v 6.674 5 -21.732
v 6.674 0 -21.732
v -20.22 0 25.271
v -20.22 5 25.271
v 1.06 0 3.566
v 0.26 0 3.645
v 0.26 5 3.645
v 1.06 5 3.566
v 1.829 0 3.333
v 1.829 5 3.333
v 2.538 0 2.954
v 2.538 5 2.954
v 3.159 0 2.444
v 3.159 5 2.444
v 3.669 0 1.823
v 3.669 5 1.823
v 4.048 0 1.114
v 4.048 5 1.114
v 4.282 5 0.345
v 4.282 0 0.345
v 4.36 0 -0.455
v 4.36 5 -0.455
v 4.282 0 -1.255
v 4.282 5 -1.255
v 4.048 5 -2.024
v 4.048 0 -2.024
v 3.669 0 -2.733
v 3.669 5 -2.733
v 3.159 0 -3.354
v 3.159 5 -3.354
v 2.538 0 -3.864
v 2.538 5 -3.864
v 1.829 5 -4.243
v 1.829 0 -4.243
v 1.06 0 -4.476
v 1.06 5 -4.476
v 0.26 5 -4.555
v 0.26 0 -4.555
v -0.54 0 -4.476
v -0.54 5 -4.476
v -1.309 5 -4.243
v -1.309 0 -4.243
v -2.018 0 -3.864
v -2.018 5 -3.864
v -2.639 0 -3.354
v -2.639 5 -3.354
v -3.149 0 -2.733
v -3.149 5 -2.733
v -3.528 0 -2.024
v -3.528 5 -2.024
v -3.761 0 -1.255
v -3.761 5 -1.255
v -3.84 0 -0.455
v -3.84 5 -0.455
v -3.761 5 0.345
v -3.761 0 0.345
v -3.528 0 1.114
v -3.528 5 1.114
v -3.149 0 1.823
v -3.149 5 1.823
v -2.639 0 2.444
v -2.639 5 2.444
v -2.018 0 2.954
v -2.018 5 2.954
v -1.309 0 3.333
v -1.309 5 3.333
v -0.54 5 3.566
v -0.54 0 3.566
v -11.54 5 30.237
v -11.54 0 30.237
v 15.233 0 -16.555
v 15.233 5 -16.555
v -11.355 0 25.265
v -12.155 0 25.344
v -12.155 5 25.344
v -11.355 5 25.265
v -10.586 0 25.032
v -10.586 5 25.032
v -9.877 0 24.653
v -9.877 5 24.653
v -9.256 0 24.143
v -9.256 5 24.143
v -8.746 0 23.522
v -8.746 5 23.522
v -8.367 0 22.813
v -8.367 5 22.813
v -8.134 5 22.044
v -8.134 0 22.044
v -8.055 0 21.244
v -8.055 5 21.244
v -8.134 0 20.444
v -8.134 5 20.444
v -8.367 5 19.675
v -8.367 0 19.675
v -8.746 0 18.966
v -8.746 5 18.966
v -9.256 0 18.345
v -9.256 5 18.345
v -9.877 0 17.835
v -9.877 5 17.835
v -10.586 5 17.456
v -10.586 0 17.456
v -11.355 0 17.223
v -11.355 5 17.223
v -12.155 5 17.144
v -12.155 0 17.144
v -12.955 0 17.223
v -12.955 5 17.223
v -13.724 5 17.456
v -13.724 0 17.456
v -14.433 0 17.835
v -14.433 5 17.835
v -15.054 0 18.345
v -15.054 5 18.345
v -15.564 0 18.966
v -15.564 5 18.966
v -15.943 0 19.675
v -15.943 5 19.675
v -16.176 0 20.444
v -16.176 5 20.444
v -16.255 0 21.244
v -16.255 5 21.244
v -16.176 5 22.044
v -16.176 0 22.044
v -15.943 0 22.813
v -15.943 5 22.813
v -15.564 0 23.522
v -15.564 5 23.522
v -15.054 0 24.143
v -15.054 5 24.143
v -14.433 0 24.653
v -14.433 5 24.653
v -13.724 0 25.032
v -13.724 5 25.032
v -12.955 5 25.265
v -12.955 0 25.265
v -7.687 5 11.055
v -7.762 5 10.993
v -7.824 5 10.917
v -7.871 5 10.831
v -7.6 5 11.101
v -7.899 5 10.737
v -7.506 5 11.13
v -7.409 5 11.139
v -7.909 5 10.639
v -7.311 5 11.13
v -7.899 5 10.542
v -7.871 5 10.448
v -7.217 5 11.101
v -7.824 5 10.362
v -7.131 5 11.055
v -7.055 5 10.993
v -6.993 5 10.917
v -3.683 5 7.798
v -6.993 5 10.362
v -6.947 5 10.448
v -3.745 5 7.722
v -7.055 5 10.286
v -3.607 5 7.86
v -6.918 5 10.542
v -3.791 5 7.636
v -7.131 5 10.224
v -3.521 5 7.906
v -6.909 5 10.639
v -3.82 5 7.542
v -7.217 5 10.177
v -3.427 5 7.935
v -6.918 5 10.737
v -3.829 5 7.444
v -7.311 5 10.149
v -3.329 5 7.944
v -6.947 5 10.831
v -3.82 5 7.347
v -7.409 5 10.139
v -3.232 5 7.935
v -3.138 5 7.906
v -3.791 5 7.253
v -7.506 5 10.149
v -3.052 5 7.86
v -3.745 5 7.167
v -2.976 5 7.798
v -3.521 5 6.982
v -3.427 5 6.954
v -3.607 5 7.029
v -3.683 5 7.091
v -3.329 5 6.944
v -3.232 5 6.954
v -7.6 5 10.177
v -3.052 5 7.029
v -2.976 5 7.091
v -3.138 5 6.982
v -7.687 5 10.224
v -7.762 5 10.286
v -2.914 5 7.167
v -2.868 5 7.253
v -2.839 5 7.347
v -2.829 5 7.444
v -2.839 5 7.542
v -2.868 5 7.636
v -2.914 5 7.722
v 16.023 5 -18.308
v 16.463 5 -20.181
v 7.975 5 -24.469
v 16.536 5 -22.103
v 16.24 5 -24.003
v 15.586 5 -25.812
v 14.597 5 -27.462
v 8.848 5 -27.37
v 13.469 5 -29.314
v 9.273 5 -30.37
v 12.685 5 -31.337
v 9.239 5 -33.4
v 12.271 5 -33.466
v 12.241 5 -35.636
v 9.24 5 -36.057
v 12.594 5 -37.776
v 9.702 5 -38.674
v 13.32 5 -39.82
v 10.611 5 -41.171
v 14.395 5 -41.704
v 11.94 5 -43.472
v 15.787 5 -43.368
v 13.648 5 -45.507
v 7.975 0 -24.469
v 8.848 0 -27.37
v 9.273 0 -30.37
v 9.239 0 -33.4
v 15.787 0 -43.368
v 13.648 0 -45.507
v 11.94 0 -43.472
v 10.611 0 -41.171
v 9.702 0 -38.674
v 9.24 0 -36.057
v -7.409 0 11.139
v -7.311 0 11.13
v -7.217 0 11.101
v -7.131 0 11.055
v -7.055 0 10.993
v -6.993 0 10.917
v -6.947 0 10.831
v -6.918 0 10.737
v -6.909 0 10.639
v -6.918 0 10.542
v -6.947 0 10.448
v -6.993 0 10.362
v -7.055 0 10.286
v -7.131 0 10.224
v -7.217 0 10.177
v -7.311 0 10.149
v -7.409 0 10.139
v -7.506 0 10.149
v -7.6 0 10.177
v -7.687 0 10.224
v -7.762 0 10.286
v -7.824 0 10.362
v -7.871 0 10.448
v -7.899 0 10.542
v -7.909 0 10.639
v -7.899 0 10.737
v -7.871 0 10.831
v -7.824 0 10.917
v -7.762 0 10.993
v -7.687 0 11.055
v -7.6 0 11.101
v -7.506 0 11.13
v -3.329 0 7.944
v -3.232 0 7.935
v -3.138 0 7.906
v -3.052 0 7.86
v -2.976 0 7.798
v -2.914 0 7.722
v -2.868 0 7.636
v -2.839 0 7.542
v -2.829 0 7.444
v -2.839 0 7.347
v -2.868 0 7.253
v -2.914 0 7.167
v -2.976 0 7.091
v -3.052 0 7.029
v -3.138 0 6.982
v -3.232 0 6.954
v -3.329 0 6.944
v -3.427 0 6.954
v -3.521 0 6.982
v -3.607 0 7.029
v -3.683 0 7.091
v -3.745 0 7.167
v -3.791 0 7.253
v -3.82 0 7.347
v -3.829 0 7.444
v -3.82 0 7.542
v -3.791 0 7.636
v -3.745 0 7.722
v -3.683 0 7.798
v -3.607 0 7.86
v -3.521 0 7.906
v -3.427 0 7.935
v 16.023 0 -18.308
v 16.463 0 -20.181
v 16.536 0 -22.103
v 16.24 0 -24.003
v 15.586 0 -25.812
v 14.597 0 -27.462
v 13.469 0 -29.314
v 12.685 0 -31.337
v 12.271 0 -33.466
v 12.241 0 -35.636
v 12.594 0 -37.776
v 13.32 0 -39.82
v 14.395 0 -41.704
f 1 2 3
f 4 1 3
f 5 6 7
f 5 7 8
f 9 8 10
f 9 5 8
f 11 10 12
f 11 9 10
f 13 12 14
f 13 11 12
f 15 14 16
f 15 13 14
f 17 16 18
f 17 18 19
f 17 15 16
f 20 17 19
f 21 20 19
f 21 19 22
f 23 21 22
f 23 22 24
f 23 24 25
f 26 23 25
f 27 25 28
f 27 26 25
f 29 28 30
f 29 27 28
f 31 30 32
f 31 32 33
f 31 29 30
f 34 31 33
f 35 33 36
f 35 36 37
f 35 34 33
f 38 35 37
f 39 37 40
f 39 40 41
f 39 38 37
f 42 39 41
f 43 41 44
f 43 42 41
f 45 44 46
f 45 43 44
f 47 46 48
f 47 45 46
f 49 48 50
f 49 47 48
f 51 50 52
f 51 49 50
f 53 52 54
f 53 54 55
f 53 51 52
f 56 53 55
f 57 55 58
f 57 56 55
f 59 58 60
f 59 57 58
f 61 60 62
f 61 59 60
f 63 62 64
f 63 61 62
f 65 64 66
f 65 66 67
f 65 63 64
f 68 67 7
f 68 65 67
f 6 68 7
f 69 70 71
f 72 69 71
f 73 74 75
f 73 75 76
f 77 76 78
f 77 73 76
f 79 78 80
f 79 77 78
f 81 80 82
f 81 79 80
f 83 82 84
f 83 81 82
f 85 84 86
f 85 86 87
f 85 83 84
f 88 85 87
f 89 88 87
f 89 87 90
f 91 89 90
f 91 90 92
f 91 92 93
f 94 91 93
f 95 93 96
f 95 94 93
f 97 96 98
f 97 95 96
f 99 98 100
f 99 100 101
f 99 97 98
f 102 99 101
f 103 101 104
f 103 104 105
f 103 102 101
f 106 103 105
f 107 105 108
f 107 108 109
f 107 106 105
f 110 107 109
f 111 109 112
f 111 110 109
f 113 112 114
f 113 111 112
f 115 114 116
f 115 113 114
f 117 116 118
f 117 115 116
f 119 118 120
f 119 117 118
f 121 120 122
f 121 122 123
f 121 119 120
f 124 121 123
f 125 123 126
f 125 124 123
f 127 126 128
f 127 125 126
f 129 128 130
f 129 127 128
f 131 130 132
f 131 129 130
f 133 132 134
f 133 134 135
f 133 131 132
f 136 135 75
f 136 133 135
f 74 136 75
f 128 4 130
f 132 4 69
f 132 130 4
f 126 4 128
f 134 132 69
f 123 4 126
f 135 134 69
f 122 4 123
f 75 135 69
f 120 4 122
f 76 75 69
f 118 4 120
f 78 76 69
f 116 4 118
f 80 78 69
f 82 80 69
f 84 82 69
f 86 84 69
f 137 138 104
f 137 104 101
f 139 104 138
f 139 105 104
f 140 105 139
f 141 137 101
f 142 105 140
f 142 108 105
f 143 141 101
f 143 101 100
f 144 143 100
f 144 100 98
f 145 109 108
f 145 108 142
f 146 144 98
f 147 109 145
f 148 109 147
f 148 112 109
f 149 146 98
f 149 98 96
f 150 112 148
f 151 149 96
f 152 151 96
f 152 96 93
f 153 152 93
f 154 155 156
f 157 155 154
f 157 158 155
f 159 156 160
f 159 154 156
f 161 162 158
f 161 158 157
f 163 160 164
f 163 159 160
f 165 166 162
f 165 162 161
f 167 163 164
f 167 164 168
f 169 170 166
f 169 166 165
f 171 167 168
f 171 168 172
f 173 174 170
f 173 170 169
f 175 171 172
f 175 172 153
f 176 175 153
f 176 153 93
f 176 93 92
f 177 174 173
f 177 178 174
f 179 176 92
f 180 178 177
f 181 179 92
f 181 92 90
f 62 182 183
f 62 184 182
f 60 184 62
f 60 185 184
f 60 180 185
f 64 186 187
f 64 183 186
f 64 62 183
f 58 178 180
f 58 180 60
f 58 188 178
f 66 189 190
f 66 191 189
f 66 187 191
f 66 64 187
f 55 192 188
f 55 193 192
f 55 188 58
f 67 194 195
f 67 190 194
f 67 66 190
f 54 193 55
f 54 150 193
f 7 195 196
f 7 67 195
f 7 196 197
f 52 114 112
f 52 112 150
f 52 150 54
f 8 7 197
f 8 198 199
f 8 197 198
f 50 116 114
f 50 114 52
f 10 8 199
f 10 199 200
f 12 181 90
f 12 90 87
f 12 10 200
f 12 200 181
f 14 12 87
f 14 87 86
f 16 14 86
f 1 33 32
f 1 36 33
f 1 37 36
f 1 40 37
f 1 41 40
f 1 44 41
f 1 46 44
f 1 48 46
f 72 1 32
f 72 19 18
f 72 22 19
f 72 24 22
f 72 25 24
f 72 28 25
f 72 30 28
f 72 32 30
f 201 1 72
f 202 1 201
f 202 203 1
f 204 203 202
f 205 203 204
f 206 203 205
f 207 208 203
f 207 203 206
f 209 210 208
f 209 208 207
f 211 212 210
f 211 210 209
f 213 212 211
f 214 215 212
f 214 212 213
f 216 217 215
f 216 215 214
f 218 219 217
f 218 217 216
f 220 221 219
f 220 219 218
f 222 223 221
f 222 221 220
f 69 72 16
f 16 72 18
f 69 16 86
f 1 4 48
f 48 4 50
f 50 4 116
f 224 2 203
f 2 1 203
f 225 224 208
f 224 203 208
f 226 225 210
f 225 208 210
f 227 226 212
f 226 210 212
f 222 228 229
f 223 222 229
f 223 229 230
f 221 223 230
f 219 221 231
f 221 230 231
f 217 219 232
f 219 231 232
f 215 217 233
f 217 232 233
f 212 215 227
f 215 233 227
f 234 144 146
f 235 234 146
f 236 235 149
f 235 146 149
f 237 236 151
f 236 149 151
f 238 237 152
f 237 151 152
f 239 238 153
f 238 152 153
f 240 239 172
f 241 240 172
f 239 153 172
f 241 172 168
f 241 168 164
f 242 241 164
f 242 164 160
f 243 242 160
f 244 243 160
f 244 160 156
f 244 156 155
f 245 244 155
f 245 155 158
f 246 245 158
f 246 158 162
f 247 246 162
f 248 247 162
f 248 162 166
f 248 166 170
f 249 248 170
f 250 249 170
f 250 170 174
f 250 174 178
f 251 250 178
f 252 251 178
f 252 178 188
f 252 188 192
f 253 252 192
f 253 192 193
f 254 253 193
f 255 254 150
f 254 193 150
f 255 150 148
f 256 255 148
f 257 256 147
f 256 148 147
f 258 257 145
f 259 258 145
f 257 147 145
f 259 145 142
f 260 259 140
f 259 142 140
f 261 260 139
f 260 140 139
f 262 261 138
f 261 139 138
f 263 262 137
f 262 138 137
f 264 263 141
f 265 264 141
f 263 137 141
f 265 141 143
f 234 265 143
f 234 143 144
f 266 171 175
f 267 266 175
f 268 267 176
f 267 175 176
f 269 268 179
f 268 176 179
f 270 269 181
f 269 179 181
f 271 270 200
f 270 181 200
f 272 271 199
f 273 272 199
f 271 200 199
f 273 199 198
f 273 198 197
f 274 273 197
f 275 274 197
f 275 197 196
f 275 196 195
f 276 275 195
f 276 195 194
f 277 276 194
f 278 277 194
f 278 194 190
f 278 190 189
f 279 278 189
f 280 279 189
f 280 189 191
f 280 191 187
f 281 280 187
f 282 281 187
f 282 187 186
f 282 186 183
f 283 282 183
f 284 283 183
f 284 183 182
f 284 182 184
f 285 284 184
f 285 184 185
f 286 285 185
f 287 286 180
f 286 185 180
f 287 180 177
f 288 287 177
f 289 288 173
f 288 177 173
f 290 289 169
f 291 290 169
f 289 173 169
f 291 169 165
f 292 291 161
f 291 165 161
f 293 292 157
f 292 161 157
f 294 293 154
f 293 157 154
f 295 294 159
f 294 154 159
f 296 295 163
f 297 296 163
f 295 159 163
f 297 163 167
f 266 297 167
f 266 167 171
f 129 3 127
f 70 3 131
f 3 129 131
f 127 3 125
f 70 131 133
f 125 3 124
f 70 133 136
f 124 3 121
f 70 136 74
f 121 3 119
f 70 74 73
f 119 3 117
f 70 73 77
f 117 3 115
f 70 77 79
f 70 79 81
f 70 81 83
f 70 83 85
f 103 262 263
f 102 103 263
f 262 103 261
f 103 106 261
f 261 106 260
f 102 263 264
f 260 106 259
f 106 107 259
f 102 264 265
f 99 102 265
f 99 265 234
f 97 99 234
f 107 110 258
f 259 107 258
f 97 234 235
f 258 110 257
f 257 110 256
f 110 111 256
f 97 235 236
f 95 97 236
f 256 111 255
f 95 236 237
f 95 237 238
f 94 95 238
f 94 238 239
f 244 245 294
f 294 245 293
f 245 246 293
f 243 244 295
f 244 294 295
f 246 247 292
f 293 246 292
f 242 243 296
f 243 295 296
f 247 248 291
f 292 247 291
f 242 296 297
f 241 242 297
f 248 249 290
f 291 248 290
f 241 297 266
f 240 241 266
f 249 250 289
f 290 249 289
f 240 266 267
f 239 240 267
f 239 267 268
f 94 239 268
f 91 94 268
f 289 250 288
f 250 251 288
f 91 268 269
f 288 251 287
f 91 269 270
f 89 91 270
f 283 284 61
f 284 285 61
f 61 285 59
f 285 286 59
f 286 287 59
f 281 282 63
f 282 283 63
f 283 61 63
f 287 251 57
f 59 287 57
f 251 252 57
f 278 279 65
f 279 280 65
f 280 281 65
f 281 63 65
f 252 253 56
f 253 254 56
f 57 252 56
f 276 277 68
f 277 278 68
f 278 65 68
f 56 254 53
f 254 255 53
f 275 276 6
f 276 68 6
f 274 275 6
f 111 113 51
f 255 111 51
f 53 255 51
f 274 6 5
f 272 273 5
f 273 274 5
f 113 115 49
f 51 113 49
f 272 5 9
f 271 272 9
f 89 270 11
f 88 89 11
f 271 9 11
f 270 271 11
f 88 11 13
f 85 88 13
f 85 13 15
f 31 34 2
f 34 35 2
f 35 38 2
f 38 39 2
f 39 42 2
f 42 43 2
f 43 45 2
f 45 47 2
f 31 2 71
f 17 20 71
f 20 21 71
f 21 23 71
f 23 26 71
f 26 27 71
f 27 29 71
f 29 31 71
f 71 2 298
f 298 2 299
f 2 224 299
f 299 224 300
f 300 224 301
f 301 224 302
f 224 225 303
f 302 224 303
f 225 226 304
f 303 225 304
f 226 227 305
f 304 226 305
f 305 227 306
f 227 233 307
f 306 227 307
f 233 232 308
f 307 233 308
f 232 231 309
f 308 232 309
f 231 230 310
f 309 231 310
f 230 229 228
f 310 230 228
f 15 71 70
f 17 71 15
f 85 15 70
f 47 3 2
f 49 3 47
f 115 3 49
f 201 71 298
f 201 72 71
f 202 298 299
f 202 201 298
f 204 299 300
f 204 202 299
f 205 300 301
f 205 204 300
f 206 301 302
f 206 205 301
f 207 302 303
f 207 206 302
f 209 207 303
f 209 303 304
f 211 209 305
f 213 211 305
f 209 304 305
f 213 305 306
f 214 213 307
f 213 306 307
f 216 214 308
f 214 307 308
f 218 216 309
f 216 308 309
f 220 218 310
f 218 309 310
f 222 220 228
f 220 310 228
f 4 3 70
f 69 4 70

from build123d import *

# Parameters (mm, degrees)
SKETCH_2_R          = 4.1
EXTRUDE_1_DEPTH     = 5
FILLET_1_R          = 20
SKETCH_6_R          = 0.5
CUT_EXTRUDE_3_DEPTH = 51.047278583
FILLET_2_R          = 10


with BuildPart() as part:
    # ｽｹｯﾁ2 → ﾎﾞｽ - 押し出し1 (new body)
    with BuildSketch(Plane(origin=(0, 0, 0), x_dir=(1, 0, 0), z_dir=(0, 1, 0))):
        with BuildLine():
            Line((10.525449769, 28.464000424), (-20.21962407, -25.270887679))
            Line((-20.21962407, -25.270887679), (-11.539937113, -30.237076794))
            Line((-11.539937113, -30.237076794), (19.283832312, 23.635351995))
            ThreePointArc((19.283832312, 23.635351995), (12.394035574, 32.590650485), (15.787121591, 43.368110179))
            Line((15.787121591, 43.368110179), (13.648123578, 45.507108192))
            ThreePointArc((13.648123578, 45.507108192), (9.431206098, 37.472115328), (10.525449769, 28.464000424))
        make_face()
        with Locations(Location((-12.155138755, -21.244217019, 0), (0, 0, 270))):
            Circle(SKETCH_2_R, mode=Mode.SUBTRACT)
        with Locations(Location((0.260334032, 0.455000374, 0), (0, 0, 270))):
            Circle(SKETCH_2_R, mode=Mode.SUBTRACT)
    extrude(amount=EXTRUDE_1_DEPTH)

    # ﾌｨﾚｯﾄ1
    fillet_1_edges = [part.edges().sort_by_distance(p)[0] for p in [
        (10.525449769, 2.5, -28.464000424),
    ]]
    fillet(fillet_1_edges, radius=FILLET_1_R)

    # ｽｹｯﾁ6 → ｶｯﾄ - 押し出し3 (cut, through all)
    with BuildSketch(Plane(origin=(0, 5, 0), x_dir=(1, 0, 0), z_dir=(0, 1, 0))):
        with Locations(Location((-7.408738509, -10.639307665, 0), (0, 0, 270))):
            Circle(SKETCH_6_R)
        with Locations(Location((-3.329499593, -7.444424173, 0), (0, 0, 270))):
            Circle(SKETCH_6_R)
    extrude(amount=-CUT_EXTRUDE_3_DEPTH, mode=Mode.SUBTRACT)

    # ﾌｨﾚｯﾄ2
    fillet_2_edges = [part.edges().sort_by_distance(p)[0] for p in [
        (19.283832312, 2.5, -23.635351995),
    ]]
    fillet(fillet_2_edges, radius=FILLET_2_R)


solid = part.part
